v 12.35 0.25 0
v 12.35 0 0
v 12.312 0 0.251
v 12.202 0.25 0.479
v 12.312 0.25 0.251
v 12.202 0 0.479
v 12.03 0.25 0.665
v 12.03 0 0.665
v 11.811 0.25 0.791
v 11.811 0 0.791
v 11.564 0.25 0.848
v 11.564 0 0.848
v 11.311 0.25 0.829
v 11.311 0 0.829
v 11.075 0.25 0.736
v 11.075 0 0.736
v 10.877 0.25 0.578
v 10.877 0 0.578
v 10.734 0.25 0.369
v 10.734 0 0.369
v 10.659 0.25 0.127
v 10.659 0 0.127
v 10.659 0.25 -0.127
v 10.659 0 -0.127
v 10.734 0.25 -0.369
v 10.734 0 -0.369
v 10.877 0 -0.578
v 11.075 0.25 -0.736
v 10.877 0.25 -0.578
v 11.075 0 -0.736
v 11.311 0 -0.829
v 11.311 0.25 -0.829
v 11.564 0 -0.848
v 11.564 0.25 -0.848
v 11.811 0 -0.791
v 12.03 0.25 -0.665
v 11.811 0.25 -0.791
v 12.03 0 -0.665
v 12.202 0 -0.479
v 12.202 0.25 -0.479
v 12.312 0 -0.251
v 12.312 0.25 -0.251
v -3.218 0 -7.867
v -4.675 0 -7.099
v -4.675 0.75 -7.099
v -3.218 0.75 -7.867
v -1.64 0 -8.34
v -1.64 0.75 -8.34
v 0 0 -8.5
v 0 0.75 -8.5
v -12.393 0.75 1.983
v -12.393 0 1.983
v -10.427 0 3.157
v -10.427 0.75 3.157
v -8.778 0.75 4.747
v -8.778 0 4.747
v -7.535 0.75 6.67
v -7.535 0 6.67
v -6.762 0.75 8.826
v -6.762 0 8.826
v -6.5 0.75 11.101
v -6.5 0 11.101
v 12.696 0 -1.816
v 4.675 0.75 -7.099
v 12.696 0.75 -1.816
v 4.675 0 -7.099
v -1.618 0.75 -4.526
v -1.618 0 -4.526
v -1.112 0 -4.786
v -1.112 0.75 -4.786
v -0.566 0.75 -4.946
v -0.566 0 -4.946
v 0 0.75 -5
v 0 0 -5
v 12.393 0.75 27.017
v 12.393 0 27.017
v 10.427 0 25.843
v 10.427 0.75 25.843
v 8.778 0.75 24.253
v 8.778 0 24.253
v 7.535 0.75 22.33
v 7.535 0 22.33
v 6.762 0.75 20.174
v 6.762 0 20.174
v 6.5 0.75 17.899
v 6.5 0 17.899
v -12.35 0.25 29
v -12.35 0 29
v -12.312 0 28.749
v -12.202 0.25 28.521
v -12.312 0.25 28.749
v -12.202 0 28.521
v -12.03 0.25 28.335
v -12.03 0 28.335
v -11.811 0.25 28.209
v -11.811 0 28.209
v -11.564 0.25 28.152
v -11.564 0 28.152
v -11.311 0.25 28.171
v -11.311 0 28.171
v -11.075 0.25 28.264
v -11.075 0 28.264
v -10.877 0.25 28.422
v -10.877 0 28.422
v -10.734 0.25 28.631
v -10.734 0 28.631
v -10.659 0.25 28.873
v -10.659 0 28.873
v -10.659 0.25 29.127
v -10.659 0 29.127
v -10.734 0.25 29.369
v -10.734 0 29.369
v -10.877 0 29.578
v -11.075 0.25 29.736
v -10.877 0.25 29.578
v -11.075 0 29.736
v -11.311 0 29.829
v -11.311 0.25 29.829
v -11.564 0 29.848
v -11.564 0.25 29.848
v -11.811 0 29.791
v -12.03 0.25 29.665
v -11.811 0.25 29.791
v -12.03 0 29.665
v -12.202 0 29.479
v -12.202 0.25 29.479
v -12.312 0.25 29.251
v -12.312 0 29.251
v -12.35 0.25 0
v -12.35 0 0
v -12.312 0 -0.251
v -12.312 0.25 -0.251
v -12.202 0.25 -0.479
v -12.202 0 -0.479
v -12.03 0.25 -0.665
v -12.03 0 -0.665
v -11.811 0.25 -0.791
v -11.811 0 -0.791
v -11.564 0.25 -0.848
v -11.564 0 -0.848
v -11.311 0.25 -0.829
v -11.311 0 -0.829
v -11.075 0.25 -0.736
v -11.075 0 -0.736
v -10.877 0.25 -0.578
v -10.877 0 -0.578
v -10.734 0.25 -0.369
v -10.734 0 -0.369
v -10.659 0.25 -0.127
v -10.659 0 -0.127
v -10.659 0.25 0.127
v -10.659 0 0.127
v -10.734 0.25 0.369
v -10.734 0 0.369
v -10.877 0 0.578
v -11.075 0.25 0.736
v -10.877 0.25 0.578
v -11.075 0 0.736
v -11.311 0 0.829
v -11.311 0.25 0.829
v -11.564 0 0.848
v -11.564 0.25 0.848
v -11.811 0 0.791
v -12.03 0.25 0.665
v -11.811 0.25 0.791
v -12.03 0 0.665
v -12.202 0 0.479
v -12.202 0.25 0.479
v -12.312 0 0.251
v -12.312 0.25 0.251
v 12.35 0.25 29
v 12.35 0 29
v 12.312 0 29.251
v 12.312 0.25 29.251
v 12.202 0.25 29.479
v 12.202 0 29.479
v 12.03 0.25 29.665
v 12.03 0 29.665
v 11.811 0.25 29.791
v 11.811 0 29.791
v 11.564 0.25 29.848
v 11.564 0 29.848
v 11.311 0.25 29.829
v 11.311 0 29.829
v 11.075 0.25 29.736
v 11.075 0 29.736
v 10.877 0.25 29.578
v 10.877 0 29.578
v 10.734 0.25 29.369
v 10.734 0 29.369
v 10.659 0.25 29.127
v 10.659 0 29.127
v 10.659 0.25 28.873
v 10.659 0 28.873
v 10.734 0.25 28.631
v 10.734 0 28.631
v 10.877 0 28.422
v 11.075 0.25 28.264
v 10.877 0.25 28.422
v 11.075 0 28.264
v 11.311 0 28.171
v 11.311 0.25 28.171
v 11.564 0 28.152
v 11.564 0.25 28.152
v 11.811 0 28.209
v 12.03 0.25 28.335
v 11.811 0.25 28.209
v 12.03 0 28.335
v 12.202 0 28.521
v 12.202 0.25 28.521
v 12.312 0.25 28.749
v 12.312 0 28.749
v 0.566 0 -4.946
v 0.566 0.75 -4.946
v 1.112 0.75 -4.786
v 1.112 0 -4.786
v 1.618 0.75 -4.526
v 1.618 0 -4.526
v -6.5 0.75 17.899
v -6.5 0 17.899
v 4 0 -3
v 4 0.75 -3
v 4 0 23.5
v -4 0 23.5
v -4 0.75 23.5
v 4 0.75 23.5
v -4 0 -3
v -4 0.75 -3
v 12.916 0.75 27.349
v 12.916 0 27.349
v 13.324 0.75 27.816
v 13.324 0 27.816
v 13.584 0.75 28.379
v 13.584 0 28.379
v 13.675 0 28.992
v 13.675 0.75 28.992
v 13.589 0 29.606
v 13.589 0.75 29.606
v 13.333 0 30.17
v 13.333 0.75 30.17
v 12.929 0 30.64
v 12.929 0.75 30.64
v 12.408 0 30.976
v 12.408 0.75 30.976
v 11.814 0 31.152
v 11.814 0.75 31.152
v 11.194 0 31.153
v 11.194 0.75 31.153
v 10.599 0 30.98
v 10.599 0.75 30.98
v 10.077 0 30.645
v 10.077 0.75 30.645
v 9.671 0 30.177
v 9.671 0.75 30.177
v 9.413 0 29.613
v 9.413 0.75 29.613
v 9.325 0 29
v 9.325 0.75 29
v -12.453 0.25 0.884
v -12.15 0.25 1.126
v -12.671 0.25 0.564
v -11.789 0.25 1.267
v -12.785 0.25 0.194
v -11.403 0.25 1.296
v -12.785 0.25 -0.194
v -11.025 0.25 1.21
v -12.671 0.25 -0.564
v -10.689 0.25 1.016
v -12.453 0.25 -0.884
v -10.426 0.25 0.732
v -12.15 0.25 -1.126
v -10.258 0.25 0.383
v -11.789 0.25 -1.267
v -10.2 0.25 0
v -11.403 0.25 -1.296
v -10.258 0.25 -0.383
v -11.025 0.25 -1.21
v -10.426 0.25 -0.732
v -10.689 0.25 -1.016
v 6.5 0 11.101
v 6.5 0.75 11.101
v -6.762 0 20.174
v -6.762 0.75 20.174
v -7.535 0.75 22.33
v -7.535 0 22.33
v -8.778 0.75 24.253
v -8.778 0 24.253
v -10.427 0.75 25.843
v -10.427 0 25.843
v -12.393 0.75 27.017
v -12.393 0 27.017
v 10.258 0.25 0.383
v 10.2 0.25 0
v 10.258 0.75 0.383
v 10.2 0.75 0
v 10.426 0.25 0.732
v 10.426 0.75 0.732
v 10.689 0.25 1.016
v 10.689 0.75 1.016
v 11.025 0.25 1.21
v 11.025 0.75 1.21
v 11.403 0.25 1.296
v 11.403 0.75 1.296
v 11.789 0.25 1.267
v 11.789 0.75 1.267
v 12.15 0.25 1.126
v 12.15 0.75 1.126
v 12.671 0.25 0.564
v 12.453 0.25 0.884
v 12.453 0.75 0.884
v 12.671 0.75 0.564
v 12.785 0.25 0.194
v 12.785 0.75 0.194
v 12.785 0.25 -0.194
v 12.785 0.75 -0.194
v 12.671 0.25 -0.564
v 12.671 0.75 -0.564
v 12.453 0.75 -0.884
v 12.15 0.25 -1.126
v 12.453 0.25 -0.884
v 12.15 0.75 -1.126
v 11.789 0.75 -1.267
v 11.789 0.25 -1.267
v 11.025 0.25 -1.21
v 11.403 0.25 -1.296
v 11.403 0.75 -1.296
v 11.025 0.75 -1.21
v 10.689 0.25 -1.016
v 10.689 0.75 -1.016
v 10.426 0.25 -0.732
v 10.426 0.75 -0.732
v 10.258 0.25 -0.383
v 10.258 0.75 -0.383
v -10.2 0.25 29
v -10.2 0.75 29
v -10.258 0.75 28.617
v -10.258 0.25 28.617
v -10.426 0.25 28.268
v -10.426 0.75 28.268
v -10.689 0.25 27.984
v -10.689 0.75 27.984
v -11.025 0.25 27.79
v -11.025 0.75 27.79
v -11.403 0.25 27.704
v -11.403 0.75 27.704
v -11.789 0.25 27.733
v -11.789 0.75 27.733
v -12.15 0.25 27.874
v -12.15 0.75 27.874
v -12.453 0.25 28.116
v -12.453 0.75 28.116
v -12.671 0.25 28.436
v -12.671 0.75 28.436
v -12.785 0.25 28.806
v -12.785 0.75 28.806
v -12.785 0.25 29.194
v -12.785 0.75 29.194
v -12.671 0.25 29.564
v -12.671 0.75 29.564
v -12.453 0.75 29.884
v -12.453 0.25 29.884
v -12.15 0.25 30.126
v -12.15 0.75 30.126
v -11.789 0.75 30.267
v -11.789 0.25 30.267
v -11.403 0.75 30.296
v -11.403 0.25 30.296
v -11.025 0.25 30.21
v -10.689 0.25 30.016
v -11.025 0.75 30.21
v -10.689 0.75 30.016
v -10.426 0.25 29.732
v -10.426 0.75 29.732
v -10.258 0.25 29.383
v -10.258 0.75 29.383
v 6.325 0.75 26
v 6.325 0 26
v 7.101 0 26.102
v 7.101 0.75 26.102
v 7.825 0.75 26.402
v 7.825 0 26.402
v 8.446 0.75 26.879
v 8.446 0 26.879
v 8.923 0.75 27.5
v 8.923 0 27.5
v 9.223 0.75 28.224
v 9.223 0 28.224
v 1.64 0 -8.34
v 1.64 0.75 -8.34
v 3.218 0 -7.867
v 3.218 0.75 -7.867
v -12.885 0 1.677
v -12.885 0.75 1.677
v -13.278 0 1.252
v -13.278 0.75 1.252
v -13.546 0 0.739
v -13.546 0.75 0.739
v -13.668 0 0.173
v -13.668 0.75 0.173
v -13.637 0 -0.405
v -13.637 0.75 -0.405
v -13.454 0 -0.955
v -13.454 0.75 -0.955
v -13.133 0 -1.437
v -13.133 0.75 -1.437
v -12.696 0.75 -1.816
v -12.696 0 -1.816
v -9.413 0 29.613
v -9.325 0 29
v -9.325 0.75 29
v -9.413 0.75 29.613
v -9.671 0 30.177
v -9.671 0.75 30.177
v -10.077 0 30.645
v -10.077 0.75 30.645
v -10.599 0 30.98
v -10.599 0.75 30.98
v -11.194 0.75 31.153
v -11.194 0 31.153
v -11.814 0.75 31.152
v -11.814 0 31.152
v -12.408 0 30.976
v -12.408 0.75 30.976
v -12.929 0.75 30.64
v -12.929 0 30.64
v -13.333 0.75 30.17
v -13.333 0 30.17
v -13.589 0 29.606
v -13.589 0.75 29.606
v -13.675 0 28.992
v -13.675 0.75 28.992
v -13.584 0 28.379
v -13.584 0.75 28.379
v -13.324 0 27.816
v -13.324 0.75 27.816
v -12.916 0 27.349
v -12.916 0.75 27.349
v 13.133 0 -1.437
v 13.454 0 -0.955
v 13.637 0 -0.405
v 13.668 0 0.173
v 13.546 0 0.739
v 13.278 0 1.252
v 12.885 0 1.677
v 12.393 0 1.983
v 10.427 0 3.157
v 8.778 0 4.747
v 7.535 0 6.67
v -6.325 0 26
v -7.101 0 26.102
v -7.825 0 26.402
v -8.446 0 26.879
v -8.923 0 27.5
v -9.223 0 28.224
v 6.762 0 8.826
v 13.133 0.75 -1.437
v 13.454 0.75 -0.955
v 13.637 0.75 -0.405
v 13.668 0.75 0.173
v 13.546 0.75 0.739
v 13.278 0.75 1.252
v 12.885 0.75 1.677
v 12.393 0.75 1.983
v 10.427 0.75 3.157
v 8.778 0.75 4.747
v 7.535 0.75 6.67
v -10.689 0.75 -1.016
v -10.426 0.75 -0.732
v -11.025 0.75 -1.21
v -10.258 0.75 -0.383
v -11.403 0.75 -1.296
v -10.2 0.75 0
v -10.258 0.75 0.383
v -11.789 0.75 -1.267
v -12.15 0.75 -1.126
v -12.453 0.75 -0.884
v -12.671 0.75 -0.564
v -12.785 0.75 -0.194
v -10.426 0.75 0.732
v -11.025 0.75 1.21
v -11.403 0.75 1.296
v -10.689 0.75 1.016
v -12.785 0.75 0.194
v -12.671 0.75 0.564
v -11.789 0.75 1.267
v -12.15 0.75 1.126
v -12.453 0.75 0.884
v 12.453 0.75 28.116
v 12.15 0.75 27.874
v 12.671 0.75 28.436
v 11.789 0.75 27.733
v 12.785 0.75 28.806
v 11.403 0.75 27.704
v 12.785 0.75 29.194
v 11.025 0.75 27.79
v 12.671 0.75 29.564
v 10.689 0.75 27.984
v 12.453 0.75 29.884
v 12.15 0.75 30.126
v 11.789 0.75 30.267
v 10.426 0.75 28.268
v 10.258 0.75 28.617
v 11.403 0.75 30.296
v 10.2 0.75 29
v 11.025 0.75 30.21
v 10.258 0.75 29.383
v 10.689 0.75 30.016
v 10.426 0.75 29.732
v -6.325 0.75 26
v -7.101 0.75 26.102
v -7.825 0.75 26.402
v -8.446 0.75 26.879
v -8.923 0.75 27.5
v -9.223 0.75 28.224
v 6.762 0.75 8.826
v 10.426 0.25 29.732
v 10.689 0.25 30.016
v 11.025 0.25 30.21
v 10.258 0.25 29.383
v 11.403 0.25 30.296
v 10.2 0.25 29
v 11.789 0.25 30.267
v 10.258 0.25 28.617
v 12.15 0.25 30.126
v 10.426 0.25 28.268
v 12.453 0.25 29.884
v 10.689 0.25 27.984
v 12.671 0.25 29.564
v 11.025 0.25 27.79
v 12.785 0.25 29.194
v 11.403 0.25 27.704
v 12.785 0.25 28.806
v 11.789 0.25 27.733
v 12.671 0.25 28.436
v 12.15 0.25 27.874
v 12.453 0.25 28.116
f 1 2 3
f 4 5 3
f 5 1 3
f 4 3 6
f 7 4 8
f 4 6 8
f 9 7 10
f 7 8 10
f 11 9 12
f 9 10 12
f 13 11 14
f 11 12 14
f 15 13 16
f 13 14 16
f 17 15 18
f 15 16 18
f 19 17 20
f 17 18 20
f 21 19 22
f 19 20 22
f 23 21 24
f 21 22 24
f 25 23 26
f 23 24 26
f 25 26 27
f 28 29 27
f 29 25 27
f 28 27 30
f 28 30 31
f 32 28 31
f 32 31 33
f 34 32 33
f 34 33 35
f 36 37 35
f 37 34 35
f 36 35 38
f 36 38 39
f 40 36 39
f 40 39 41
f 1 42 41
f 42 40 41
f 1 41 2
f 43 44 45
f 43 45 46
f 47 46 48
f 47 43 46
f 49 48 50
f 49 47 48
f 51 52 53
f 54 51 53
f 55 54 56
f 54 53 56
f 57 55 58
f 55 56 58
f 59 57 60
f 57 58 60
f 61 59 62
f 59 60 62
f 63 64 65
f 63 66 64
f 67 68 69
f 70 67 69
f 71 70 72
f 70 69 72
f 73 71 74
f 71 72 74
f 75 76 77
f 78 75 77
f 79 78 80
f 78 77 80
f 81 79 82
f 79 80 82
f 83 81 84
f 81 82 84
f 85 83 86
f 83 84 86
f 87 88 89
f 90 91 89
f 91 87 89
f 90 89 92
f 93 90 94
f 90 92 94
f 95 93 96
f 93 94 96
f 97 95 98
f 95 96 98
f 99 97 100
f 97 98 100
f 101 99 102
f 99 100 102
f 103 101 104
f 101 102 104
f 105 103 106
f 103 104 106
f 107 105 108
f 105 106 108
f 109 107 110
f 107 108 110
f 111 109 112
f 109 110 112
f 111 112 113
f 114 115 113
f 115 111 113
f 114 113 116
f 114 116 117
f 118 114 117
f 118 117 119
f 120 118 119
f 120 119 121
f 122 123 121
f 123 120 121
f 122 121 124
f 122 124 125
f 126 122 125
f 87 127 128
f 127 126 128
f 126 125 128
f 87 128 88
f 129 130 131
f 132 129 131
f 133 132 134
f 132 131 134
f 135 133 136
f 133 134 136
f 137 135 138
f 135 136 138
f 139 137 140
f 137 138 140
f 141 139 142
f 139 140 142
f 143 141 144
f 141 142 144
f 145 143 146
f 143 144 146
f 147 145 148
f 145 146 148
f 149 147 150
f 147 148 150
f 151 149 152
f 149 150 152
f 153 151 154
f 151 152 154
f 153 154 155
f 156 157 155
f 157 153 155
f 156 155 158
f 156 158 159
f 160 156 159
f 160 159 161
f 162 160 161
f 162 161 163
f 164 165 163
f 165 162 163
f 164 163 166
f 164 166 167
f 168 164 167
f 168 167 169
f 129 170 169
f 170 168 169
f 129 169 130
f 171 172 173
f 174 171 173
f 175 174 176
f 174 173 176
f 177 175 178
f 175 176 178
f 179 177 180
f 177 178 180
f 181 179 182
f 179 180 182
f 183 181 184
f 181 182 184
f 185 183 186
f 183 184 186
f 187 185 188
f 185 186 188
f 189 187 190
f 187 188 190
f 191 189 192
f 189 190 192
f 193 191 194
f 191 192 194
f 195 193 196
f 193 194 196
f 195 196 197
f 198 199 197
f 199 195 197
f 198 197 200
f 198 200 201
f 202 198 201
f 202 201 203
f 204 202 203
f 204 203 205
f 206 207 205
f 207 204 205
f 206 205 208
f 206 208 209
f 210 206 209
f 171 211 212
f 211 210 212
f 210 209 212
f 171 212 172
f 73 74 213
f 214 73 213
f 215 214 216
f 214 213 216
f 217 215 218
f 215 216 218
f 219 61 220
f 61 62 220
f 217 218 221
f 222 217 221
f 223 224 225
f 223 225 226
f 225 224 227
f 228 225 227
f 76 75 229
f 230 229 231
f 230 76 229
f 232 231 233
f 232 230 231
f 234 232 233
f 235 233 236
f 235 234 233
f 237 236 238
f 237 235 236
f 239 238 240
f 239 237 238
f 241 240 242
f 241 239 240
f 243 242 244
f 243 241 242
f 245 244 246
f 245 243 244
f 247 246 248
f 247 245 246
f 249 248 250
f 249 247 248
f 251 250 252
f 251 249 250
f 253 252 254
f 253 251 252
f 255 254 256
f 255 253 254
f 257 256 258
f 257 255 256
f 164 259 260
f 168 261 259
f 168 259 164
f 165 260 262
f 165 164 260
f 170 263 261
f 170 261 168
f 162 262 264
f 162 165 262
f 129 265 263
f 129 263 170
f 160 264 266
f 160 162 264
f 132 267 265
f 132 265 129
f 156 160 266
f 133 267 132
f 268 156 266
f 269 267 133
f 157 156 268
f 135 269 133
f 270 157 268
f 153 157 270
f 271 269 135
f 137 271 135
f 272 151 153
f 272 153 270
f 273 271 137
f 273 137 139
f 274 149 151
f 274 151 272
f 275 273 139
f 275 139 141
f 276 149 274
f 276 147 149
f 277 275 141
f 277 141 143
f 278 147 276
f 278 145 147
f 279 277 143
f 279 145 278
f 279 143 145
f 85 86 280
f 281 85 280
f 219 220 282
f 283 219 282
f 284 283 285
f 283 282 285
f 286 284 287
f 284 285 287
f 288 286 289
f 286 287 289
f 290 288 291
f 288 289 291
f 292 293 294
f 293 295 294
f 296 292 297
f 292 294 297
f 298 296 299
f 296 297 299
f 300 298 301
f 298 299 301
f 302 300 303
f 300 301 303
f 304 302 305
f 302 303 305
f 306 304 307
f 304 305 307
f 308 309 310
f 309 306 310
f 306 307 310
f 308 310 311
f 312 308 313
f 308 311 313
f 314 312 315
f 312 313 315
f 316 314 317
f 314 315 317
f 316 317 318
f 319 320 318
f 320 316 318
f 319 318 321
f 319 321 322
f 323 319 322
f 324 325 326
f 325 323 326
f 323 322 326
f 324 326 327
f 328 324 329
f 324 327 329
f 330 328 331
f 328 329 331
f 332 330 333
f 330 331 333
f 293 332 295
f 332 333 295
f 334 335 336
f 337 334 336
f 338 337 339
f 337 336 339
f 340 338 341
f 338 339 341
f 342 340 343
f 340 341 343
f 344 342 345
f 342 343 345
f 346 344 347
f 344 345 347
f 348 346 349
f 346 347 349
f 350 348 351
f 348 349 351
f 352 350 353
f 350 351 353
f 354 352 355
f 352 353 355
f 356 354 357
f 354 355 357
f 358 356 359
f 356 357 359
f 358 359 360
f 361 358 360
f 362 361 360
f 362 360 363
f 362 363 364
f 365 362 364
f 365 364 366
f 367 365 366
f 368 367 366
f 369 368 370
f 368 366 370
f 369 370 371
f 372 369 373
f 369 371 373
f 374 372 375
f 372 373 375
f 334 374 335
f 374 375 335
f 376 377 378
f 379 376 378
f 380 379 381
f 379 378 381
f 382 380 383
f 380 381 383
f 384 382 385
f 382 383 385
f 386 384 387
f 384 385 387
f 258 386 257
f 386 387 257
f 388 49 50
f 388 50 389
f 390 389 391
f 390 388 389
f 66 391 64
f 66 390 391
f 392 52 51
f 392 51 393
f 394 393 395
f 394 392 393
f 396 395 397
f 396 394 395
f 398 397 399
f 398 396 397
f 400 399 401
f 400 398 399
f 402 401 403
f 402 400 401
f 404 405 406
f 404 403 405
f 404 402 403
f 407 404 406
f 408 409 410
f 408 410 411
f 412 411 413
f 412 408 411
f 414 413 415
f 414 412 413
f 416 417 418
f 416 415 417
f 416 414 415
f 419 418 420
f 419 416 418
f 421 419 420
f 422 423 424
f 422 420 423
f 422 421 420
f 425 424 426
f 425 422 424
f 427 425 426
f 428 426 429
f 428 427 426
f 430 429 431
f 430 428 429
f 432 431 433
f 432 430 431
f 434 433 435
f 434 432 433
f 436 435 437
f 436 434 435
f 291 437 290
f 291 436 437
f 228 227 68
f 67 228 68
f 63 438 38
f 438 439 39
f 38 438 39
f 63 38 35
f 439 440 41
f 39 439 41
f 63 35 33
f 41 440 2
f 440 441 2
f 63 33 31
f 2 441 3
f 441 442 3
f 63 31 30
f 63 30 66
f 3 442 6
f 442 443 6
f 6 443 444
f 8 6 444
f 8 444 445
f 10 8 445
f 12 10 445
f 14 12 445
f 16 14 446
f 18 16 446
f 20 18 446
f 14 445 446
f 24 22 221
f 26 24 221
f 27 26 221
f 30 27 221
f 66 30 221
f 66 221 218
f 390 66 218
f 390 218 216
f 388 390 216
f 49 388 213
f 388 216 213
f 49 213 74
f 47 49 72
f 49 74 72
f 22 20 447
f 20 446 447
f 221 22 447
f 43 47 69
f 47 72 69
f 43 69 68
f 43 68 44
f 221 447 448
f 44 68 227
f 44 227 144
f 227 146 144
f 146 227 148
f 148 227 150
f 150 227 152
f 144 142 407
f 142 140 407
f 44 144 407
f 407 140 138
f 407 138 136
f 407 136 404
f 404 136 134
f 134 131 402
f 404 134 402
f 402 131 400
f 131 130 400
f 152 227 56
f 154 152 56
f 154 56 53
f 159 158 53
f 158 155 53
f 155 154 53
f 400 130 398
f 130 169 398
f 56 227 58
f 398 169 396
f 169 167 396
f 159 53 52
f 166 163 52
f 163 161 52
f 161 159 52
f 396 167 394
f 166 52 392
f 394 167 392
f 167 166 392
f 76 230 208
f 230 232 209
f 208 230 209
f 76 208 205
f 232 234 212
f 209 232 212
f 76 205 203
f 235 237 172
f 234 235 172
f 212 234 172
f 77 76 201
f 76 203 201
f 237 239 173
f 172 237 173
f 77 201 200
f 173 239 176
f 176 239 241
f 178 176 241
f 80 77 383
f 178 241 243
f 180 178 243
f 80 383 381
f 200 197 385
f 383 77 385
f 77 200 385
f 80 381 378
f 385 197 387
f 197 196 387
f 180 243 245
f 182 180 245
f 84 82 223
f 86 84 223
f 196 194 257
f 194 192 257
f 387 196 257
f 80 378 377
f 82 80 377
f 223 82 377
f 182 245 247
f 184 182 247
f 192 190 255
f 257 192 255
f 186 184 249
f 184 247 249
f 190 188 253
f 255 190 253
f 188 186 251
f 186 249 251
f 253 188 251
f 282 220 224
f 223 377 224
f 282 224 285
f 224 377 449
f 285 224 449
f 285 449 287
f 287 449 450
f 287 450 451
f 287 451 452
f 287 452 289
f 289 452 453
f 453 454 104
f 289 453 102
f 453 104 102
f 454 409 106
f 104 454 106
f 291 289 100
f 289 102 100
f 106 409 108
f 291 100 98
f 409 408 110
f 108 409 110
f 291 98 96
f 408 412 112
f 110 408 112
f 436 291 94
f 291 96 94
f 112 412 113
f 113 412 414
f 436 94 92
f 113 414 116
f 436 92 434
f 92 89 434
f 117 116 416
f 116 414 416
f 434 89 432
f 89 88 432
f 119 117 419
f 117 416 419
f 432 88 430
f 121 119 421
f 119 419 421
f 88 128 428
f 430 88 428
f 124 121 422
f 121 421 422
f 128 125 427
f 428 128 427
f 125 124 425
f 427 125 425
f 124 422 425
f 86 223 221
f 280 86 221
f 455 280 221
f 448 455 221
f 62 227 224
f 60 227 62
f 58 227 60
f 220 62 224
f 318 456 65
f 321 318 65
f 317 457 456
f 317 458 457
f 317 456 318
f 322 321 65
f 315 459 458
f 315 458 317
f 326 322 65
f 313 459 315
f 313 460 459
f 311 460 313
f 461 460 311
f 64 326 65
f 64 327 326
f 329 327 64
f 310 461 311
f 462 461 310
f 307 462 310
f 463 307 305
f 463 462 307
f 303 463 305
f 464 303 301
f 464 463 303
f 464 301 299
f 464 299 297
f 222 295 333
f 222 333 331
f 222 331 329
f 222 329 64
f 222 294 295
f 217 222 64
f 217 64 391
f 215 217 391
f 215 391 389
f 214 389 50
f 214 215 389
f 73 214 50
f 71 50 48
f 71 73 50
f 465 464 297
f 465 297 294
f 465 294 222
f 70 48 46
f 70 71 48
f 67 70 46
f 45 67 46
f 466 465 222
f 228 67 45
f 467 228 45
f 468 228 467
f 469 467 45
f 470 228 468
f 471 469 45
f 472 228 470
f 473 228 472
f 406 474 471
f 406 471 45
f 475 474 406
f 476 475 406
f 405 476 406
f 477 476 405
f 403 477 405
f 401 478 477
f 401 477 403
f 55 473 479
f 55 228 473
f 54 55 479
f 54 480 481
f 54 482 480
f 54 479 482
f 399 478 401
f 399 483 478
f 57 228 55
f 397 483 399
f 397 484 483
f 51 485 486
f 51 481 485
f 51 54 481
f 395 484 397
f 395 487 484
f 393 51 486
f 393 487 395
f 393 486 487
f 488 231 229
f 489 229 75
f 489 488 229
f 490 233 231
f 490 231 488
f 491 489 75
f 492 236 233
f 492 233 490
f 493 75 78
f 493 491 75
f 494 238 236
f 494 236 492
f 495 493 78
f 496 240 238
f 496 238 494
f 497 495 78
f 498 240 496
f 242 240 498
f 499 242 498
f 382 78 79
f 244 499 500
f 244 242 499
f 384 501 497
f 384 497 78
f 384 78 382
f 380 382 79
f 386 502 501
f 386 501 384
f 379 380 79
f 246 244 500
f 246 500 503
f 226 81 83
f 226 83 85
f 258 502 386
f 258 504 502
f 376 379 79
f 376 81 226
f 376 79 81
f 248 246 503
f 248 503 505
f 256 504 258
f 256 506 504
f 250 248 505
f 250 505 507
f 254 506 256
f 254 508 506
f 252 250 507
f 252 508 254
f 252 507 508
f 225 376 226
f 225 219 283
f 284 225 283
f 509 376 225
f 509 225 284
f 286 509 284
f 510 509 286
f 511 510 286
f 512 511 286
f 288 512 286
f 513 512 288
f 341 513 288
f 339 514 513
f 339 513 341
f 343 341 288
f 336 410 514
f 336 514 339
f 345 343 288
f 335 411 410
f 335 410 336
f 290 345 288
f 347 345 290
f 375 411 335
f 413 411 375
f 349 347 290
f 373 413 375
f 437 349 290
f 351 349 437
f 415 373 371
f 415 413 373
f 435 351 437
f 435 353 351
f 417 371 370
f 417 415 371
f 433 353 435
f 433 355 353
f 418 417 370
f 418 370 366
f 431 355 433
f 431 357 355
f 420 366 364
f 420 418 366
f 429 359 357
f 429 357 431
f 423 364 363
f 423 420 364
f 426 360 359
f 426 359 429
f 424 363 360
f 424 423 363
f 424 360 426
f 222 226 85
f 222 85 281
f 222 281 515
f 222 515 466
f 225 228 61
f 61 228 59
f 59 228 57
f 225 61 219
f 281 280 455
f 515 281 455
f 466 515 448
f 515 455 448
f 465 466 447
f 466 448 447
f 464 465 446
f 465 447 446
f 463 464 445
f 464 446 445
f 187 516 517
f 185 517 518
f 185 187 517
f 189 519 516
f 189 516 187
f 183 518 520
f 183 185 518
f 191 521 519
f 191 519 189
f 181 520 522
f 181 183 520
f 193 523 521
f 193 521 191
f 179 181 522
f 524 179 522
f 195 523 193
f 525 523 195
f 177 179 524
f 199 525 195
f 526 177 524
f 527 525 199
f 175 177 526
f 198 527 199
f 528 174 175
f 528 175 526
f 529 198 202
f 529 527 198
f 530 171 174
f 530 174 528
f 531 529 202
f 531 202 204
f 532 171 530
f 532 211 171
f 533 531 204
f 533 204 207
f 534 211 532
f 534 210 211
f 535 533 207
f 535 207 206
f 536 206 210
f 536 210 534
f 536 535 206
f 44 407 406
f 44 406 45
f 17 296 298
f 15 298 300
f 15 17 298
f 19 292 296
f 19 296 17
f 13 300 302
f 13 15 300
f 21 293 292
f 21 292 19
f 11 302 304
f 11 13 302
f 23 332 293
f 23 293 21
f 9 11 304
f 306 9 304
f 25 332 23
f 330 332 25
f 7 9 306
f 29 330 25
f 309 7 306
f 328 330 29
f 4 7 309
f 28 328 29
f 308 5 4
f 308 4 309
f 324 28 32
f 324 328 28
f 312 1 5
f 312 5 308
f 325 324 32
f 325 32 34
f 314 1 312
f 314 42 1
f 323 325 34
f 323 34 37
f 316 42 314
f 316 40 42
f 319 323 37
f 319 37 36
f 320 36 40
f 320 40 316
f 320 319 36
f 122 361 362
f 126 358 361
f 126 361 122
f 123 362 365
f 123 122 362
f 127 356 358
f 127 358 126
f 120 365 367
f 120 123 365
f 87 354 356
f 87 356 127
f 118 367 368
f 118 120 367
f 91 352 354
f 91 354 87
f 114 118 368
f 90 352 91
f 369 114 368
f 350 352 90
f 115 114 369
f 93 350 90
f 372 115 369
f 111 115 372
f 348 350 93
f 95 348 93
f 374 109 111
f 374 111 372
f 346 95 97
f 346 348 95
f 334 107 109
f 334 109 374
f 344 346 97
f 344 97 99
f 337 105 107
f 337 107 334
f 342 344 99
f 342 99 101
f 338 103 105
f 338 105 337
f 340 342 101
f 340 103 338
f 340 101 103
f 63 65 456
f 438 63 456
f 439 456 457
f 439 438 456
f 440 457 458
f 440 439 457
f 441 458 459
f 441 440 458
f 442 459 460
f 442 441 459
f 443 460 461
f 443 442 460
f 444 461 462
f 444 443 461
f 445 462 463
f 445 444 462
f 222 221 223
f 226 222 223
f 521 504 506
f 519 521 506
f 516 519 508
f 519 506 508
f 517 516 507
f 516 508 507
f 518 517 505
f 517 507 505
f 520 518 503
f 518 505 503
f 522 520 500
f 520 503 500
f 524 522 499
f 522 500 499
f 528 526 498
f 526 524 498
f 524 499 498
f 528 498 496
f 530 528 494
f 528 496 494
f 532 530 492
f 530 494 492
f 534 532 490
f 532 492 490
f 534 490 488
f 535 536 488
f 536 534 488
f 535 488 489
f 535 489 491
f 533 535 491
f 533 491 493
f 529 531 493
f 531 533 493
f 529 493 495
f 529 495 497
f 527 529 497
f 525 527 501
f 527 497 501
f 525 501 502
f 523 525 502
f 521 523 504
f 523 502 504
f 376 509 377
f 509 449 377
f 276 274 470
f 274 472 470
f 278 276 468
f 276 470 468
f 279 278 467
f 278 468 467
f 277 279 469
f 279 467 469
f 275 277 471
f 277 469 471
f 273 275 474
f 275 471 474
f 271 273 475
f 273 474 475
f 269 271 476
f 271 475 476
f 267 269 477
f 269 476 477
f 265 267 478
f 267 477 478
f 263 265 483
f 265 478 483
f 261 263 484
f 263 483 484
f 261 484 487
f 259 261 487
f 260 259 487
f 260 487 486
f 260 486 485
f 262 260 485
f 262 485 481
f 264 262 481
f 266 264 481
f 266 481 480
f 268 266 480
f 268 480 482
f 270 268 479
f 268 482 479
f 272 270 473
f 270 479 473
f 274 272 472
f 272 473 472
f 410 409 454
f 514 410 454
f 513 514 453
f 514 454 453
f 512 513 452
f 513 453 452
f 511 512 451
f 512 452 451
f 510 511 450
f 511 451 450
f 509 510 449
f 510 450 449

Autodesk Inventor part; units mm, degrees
ref_plane "YZ Plane" through (0, 0, 0) normal (1, 0, 0) x (0, 1, 0)
ref_plane "XZ Plane" through (0, 0, 0) normal (0, 1, 0) x (-1, 0, 0)
ref_plane "XY Plane" through (0, 0, 0) normal (0, 0, 1) x (1, 0, 0)
sketch "スケッチ1" plane through (0, 0, 0) normal (0, 1, 0) x (-1, 0, 0)
  circle A0 centre (11.5, 0) radius 0.85
  circle A1 centre (11.5, 29) radius 0.85
  line L0 (0, -11.6446) -> (0, 36.0381)
  arc A2 (12.3932, 27.0169) -> (9.325, 29) centre (11.5, 29) ccw
  arc A3 (12.6962, -1.8165) -> (12.3932, 1.9831) centre (11.5, 0) ccw
  circle A4 centre (0, 0) radius 5
  line L1 (4, 23.5) -> (4, -3)
  line L2 (4, -3) -> (1.6185, -4.5259)
  line L3 (12.6962, -1.8165) -> (4.675, -7.0989)
  arc A5 (0, -8.5) -> (4.675, -7.0989) centre (0, 0) ccw
  circle A6 centre (0, -2) radius 3
  line L4 (4, 23.5) -> (0, 23.5)
  line L5 (14.3325, 28.15) -> (9.1092, 28.15)
  line L6 (-4, 23.5) -> (-4, -3)
  line L7 (-4, -3) -> (-1.6185, -4.5259)
  line L8 (-4, 23.5) -> (0, 23.5)
  line L9 (6.5, 11.1009) -> (6.5, 17.8991)
  arc A7 (6.325, 26) -> (9.325, 29) centre (6.325, 29) ccw
  line L10 (6.325, 26) -> (0, 26)
  arc A8 (12.3932, 27.0169) -> (6.5, 17.8991) centre (16.5, 17.8991) ccw
  arc A9 (6.5, 11.1009) -> (12.3932, 1.9831) centre (16.5, 11.1009) ccw
  circle A10 centre (11.5, 0) radius 1.175
  circle A11 centre (11.5, 29) radius 1.175
  point P0 (0, 30.9357)
  point P1 (4, 3)
  point P2 (0, 26.5)
  point P3 (0, -5)
  point P4 (-1.6185, -4.5259)
  point P5 (0, 1)
  point P6 (-4, 3)
  point P7 (0, -5)
  point P8 (3.4728, -6.6475)
  point P9 (0, 5)
  point P10 (0, -5)
  point P11 (2.7322, -4.1875)
  point P12 (-4, -3)
  dimension "d7" = 10
  dimension "d2" = 29
  dimension "d18" = 8.5
  dimension "d24" = 1.7
  dimension "d25" = 2
  dimension "d39" = 8
  dimension "d41" = 2.5
  dimension "d43" = 2.5
  dimension "d44" = 10
  dimension "d45" = 23
  dimension "d47" = 3
  dimension "d48" = 2.35
  dimension "d49" = 1
  dimension "d50" = 1
extrude "押し出し1" add sketch "スケッチ1" along normal blind 0.75 contours L5 A11 | L5 A11 | A11 L5 A7 A2 | L5 A2 A8 L9 A9 A3 L3 A5 L0 A4 L1 L4 L10 A7 A11 | A4 L1 | A6 L2 A4 | A10
sketch "スケッチ2" plane through (0, 0.75, 0) normal (0, 1, 0) x (1, 0, 0)
  circle A0 centre (-11.5, 0) radius 1.3
  circle A1 centre (-11.5, 0) radius 0.85 projected
  circle A2 centre (-11.5, -29) radius 0.85 projected
  circle A3 centre (-11.5, -29) radius 0.85 projected
  circle A4 centre (-11.5, -29) radius 1.3
  point P0 (0, 0)
  dimension "d51" = 2.6
extrude "押し出し2" cut sketch "スケッチ2" against normal blind 0.5
mirror "ミラー2" about plane through (0, 0, 26) normal (1, 0, 0) of "押し出し1", "押し出し2"
properties part number "Skirt"
